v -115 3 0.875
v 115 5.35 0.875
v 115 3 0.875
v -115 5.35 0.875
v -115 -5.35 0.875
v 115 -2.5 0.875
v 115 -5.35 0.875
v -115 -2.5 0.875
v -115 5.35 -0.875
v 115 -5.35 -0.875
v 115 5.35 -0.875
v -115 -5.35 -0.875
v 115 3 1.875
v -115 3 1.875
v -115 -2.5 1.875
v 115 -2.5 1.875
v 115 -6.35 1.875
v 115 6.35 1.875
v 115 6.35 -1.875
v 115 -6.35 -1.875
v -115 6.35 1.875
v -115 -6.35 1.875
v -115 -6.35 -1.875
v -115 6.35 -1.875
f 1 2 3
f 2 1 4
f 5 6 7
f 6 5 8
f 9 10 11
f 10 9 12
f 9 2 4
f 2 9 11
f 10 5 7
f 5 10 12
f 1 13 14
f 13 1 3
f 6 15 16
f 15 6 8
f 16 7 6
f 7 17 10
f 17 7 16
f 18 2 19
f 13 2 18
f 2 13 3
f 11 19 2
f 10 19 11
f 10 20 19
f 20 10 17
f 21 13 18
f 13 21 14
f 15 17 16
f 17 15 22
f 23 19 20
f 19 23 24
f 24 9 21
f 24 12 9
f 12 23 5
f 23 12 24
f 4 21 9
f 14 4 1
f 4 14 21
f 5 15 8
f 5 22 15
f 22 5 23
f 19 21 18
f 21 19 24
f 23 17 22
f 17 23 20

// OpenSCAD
// for nonWP strip no shrink wrap
StripWidth = 10.7;  
StripHeight = 1.75; 
StripGap = 5.5; // leave clearance for the LED's to shine through
offset = 0.25;


// For nonWP strip With Shrin
//StripWidth = 10.9;  
//StripHeight = 3; 
//StripGap = 6; // leave clearance for the LED's to shine through
//offset = 0.25;

// For WP strip with shrink wrap
//StripWidth = 10.7;  
//StripHeight = 4; 
//StripGap = 6.5; // leave clearance for the LED's to shine through
// offset = 0;


// For WP strip no shrink wrap
//StripWidth = 10.5;  
//StripHeight = 2.5; 
//StripGap = 6.5; // leave clearance for the LED's to shine through
// offset = 0;



SideWall = 2;
TopWall = 2;
Length = 230;



module remove() {
    union(){
        cube([Length+1,StripWidth,StripHeight], center=true);
        translate([0,0+offset,(StripHeight-.01)]) 
        cube([Length+1, StripGap, StripHeight], center=true);
        
    }
}

translate([0,0,0]) {
    difference() {
        cube([Length, (StripWidth+SideWall), (StripHeight+TopWall)], center=true);
        remove();
    }
}
